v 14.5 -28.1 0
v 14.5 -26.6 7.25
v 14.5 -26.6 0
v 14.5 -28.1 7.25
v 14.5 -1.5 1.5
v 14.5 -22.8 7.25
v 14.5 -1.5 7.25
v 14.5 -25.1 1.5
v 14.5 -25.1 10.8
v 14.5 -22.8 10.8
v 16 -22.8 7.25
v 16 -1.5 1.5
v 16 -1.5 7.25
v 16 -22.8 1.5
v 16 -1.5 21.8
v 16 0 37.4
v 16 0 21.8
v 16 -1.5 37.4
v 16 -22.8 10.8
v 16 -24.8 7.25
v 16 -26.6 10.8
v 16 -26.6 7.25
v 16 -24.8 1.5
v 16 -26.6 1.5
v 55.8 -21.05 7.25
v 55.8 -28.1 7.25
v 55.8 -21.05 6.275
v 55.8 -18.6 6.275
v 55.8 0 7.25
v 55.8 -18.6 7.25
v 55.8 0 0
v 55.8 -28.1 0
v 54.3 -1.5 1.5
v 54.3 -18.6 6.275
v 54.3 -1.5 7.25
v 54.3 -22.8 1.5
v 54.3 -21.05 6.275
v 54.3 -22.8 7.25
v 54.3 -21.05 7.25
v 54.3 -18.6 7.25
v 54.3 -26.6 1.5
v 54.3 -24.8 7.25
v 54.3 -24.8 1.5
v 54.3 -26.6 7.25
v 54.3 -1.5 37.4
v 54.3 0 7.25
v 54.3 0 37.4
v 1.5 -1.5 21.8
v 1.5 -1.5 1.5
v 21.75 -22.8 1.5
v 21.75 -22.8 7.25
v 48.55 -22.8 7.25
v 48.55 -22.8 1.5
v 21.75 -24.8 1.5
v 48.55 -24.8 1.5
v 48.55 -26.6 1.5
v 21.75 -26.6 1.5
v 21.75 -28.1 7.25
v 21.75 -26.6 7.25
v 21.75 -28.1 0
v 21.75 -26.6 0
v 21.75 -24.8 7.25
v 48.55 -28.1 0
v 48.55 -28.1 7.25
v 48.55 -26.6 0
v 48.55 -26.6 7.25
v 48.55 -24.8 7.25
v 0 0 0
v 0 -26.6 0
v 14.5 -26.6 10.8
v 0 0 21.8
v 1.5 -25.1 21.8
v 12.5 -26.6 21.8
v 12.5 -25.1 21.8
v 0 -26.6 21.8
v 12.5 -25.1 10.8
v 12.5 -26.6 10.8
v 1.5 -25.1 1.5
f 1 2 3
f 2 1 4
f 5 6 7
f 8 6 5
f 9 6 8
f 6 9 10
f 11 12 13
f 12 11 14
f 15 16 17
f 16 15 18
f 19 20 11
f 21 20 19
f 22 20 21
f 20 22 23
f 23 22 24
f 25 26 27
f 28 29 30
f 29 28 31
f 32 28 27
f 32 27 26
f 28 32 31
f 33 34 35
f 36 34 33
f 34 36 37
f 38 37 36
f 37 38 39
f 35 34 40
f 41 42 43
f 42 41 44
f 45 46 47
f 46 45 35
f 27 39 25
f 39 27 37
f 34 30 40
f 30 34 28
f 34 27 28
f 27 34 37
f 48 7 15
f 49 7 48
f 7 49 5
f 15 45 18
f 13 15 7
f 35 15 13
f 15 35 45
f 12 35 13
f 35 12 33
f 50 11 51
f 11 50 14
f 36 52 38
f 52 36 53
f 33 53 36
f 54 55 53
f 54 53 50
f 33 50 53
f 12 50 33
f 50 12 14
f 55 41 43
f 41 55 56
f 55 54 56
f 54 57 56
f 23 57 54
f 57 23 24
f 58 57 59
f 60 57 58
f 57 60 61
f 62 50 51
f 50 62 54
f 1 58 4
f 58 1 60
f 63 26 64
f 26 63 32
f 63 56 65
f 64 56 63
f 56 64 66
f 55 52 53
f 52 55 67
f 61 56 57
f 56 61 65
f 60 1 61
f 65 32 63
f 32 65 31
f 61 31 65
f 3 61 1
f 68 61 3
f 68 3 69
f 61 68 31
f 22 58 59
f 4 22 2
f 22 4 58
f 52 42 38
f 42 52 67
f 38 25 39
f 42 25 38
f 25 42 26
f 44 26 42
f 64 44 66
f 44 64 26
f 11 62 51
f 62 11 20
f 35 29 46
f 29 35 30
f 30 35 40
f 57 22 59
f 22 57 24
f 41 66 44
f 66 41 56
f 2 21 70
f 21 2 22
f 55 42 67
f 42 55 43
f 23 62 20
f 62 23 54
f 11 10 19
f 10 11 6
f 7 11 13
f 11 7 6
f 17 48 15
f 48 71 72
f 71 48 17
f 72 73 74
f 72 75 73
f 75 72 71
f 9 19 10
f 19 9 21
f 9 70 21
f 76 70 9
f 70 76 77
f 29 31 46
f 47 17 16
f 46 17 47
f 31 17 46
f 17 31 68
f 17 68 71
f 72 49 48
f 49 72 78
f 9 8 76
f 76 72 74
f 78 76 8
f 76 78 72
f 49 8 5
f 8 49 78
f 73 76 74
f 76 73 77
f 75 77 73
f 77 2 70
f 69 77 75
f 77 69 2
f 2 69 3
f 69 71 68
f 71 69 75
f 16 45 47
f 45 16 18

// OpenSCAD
PM25_X = 38.3;
PM25_Y = 50.1;
PM25_Z = 21.3;
WALL_SIZE = 1.5;
TAB_X = 5.75;
TAB_Y = 5.75;
PCB_SPACER = 2;
PCB_THICKNESS = 1.8;
BRIM = TAB_X;
CABLE_BOX_X = 13;
BIG_VENT_CENTER = 35.9;

// JST cable cutout
JST_DISTANCE_FROM_EDGE = 9.3;
JST_WIDTH = 11;
CABLE_SPACE = 2;

module leftCutout() {
  translate([-WALL_SIZE, BRIM, 0])
    linear_extrude(PM25_Z)
    square(size = [WALL_SIZE, PM25_Y - (2 * BRIM)]);

  translate([-WALL_SIZE, JST_DISTANCE_FROM_EDGE, 0])
    linear_extrude(PM25_Z + PCB_THICKNESS + PCB_SPACER)
    square(size = [WALL_SIZE, JST_WIDTH]);
}

module rightCutout() {
  translate([PM25_X, BRIM, -WALL_SIZE])
    linear_extrude(PM25_Z + PCB_THICKNESS + PCB_SPACER + (WALL_SIZE * 2))
    square(size = [WALL_SIZE, PM25_Y - (2 * BRIM)]);
}

module bottomCutout() {
  translate([-WALL_SIZE, BRIM, -WALL_SIZE])
    linear_extrude(WALL_SIZE)
    square(size = [PM25_X + (WALL_SIZE * 2), PM25_Y - (2 * BRIM)]);
}

module pcbCutout() {
  translate([TAB_X, 0, PM25_Z])
    linear_extrude(PCB_SPACER + PCB_THICKNESS + WALL_SIZE)
    square(size = [PM25_X - (TAB_X * 2), PM25_Y]);

  translate([TAB_X, -WALL_SIZE, PM25_Z + PCB_SPACER + PCB_THICKNESS])
    linear_extrude(WALL_SIZE)
    square(size = [PM25_X - (TAB_X * 2), PM25_Y + (WALL_SIZE * 2)]);

  translate([0, TAB_Y, PM25_Z])
    linear_extrude(PCB_SPACER + PCB_THICKNESS + WALL_SIZE)
    square(size = [PM25_X, PM25_Y - (TAB_Y * 2)]);

  translate([-WALL_SIZE, TAB_Y, PM25_Z + PCB_SPACER + PCB_THICKNESS])
    linear_extrude(WALL_SIZE)
    square(size = [PM25_X + (WALL_SIZE * 2), PM25_Y - (TAB_Y * 2)]);

  translate([0, 0, PM25_Z + PCB_SPACER])
    linear_extrude(PCB_THICKNESS)
    square(size = [PM25_X, PM25_Y]);
}

module pmcutout() {
  port_d = 2.45;
  fan_r = 9;

  jst_height = 4.9;
  jst_len = 17;
  translate([-WALL_SIZE, PM25_Y - jst_len - 5.5, (PM25_Z / 2) + jst_height / 2])
  rotate([0, 90, 0])
    color("blue")
    linear_extrude(WALL_SIZE)
    square(size = [jst_height, jst_len]);

  translate([PM25_X, BIG_VENT_CENTER, PM25_Z / 2])
  rotate([0, 90, 0])
    linear_extrude(WALL_SIZE)
    circle(r = fan_r);

  translate([PM25_X, 6 - (port_d / 2), PM25_Z - (4.2 - port_d)])
    rotate([0, 90, 0])
    color("green")
    linear_extrude(WALL_SIZE)
    square(size = [port_d, 12.0 + port_d]);

  linear_extrude(PM25_Z)
    square(size = [PM25_X, PM25_Y]);
}

module pmcase() {
  translate([CABLE_BOX_X + WALL_SIZE, 0, 0]) {
    translate([WALL_SIZE, WALL_SIZE, WALL_SIZE])
      difference() {
        translate([-WALL_SIZE, -WALL_SIZE, -WALL_SIZE])
          linear_extrude(PM25_Z + (WALL_SIZE * 2) + PCB_SPACER + PCB_THICKNESS)
          square(size = [PM25_X + (WALL_SIZE * 2), PM25_Y + (WALL_SIZE * 2)]);
        pmcutout();
        pcbCutout();
        //bottomCutout();
        leftCutout();
        rightCutout();
      }
    translate([-(CABLE_BOX_X + WALL_SIZE), 0, 0])
      cablecase();
  }
}

module cablecaseCutout() {
  height = PM25_Z + PCB_SPACER + PCB_THICKNESS - WALL_SIZE;
  linear_extrude(height)
    square(size = [CABLE_BOX_X, PM25_Y]);

  translate([CABLE_BOX_X - CABLE_SPACE, JST_DISTANCE_FROM_EDGE, height])
    linear_extrude(WALL_SIZE)
    square(size = [CABLE_SPACE, JST_WIDTH]);
}

module cablecase() {
  translate([WALL_SIZE, WALL_SIZE, WALL_SIZE])
  difference() {
    translate([-WALL_SIZE, -WALL_SIZE, -WALL_SIZE])
      linear_extrude(PM25_Z + PCB_SPACER + PCB_THICKNESS + WALL_SIZE)
      square(size = [CABLE_BOX_X + WALL_SIZE, PM25_Y + (WALL_SIZE * 2)]);
    cablecaseCutout();
  }
}

module Bottom() {
  difference() {
    pmcase();

    translate([CABLE_BOX_X + WALL_SIZE, (BIG_VENT_CENTER + WALL_SIZE), 0])
      color("blue")
      linear_extrude(PM25_Z + WALL_SIZE * 2 + PCB_SPACER + PCB_THICKNESS)
      square(size = [PM25_X + (WALL_SIZE * 2), (PM25_Y - BIG_VENT_CENTER + WALL_SIZE)]);

    translate([0, JST_DISTANCE_FROM_EDGE + WALL_SIZE + JST_WIDTH, 0])
      linear_extrude(PM25_Z + WALL_SIZE * 2 + PCB_SPACER + PCB_THICKNESS)
      square(size = [CABLE_BOX_X + (WALL_SIZE * 2), PM25_Y + (WALL_SIZE * 2)]);

  }
}

module TopSlice() {
    translate([CABLE_BOX_X + (WALL_SIZE * 2), 0, 0])
      color("blue")
      linear_extrude(PM25_Z + WALL_SIZE * 2 + PCB_SPACER + PCB_THICKNESS)
      square(size = [PM25_X + WALL_SIZE, BIG_VENT_CENTER + WALL_SIZE]);

      linear_extrude(PM25_Z + WALL_SIZE * 2 + PCB_SPACER + PCB_THICKNESS)
      square(size = [CABLE_BOX_X + (WALL_SIZE * 2), WALL_SIZE + JST_DISTANCE_FROM_EDGE + JST_WIDTH]);

}

module Top() {
  difference() {
    pmcase();
    TopSlice();
  }
}

//pmcase();
//Top();
rotate([90, 0, 0])
Bottom();
